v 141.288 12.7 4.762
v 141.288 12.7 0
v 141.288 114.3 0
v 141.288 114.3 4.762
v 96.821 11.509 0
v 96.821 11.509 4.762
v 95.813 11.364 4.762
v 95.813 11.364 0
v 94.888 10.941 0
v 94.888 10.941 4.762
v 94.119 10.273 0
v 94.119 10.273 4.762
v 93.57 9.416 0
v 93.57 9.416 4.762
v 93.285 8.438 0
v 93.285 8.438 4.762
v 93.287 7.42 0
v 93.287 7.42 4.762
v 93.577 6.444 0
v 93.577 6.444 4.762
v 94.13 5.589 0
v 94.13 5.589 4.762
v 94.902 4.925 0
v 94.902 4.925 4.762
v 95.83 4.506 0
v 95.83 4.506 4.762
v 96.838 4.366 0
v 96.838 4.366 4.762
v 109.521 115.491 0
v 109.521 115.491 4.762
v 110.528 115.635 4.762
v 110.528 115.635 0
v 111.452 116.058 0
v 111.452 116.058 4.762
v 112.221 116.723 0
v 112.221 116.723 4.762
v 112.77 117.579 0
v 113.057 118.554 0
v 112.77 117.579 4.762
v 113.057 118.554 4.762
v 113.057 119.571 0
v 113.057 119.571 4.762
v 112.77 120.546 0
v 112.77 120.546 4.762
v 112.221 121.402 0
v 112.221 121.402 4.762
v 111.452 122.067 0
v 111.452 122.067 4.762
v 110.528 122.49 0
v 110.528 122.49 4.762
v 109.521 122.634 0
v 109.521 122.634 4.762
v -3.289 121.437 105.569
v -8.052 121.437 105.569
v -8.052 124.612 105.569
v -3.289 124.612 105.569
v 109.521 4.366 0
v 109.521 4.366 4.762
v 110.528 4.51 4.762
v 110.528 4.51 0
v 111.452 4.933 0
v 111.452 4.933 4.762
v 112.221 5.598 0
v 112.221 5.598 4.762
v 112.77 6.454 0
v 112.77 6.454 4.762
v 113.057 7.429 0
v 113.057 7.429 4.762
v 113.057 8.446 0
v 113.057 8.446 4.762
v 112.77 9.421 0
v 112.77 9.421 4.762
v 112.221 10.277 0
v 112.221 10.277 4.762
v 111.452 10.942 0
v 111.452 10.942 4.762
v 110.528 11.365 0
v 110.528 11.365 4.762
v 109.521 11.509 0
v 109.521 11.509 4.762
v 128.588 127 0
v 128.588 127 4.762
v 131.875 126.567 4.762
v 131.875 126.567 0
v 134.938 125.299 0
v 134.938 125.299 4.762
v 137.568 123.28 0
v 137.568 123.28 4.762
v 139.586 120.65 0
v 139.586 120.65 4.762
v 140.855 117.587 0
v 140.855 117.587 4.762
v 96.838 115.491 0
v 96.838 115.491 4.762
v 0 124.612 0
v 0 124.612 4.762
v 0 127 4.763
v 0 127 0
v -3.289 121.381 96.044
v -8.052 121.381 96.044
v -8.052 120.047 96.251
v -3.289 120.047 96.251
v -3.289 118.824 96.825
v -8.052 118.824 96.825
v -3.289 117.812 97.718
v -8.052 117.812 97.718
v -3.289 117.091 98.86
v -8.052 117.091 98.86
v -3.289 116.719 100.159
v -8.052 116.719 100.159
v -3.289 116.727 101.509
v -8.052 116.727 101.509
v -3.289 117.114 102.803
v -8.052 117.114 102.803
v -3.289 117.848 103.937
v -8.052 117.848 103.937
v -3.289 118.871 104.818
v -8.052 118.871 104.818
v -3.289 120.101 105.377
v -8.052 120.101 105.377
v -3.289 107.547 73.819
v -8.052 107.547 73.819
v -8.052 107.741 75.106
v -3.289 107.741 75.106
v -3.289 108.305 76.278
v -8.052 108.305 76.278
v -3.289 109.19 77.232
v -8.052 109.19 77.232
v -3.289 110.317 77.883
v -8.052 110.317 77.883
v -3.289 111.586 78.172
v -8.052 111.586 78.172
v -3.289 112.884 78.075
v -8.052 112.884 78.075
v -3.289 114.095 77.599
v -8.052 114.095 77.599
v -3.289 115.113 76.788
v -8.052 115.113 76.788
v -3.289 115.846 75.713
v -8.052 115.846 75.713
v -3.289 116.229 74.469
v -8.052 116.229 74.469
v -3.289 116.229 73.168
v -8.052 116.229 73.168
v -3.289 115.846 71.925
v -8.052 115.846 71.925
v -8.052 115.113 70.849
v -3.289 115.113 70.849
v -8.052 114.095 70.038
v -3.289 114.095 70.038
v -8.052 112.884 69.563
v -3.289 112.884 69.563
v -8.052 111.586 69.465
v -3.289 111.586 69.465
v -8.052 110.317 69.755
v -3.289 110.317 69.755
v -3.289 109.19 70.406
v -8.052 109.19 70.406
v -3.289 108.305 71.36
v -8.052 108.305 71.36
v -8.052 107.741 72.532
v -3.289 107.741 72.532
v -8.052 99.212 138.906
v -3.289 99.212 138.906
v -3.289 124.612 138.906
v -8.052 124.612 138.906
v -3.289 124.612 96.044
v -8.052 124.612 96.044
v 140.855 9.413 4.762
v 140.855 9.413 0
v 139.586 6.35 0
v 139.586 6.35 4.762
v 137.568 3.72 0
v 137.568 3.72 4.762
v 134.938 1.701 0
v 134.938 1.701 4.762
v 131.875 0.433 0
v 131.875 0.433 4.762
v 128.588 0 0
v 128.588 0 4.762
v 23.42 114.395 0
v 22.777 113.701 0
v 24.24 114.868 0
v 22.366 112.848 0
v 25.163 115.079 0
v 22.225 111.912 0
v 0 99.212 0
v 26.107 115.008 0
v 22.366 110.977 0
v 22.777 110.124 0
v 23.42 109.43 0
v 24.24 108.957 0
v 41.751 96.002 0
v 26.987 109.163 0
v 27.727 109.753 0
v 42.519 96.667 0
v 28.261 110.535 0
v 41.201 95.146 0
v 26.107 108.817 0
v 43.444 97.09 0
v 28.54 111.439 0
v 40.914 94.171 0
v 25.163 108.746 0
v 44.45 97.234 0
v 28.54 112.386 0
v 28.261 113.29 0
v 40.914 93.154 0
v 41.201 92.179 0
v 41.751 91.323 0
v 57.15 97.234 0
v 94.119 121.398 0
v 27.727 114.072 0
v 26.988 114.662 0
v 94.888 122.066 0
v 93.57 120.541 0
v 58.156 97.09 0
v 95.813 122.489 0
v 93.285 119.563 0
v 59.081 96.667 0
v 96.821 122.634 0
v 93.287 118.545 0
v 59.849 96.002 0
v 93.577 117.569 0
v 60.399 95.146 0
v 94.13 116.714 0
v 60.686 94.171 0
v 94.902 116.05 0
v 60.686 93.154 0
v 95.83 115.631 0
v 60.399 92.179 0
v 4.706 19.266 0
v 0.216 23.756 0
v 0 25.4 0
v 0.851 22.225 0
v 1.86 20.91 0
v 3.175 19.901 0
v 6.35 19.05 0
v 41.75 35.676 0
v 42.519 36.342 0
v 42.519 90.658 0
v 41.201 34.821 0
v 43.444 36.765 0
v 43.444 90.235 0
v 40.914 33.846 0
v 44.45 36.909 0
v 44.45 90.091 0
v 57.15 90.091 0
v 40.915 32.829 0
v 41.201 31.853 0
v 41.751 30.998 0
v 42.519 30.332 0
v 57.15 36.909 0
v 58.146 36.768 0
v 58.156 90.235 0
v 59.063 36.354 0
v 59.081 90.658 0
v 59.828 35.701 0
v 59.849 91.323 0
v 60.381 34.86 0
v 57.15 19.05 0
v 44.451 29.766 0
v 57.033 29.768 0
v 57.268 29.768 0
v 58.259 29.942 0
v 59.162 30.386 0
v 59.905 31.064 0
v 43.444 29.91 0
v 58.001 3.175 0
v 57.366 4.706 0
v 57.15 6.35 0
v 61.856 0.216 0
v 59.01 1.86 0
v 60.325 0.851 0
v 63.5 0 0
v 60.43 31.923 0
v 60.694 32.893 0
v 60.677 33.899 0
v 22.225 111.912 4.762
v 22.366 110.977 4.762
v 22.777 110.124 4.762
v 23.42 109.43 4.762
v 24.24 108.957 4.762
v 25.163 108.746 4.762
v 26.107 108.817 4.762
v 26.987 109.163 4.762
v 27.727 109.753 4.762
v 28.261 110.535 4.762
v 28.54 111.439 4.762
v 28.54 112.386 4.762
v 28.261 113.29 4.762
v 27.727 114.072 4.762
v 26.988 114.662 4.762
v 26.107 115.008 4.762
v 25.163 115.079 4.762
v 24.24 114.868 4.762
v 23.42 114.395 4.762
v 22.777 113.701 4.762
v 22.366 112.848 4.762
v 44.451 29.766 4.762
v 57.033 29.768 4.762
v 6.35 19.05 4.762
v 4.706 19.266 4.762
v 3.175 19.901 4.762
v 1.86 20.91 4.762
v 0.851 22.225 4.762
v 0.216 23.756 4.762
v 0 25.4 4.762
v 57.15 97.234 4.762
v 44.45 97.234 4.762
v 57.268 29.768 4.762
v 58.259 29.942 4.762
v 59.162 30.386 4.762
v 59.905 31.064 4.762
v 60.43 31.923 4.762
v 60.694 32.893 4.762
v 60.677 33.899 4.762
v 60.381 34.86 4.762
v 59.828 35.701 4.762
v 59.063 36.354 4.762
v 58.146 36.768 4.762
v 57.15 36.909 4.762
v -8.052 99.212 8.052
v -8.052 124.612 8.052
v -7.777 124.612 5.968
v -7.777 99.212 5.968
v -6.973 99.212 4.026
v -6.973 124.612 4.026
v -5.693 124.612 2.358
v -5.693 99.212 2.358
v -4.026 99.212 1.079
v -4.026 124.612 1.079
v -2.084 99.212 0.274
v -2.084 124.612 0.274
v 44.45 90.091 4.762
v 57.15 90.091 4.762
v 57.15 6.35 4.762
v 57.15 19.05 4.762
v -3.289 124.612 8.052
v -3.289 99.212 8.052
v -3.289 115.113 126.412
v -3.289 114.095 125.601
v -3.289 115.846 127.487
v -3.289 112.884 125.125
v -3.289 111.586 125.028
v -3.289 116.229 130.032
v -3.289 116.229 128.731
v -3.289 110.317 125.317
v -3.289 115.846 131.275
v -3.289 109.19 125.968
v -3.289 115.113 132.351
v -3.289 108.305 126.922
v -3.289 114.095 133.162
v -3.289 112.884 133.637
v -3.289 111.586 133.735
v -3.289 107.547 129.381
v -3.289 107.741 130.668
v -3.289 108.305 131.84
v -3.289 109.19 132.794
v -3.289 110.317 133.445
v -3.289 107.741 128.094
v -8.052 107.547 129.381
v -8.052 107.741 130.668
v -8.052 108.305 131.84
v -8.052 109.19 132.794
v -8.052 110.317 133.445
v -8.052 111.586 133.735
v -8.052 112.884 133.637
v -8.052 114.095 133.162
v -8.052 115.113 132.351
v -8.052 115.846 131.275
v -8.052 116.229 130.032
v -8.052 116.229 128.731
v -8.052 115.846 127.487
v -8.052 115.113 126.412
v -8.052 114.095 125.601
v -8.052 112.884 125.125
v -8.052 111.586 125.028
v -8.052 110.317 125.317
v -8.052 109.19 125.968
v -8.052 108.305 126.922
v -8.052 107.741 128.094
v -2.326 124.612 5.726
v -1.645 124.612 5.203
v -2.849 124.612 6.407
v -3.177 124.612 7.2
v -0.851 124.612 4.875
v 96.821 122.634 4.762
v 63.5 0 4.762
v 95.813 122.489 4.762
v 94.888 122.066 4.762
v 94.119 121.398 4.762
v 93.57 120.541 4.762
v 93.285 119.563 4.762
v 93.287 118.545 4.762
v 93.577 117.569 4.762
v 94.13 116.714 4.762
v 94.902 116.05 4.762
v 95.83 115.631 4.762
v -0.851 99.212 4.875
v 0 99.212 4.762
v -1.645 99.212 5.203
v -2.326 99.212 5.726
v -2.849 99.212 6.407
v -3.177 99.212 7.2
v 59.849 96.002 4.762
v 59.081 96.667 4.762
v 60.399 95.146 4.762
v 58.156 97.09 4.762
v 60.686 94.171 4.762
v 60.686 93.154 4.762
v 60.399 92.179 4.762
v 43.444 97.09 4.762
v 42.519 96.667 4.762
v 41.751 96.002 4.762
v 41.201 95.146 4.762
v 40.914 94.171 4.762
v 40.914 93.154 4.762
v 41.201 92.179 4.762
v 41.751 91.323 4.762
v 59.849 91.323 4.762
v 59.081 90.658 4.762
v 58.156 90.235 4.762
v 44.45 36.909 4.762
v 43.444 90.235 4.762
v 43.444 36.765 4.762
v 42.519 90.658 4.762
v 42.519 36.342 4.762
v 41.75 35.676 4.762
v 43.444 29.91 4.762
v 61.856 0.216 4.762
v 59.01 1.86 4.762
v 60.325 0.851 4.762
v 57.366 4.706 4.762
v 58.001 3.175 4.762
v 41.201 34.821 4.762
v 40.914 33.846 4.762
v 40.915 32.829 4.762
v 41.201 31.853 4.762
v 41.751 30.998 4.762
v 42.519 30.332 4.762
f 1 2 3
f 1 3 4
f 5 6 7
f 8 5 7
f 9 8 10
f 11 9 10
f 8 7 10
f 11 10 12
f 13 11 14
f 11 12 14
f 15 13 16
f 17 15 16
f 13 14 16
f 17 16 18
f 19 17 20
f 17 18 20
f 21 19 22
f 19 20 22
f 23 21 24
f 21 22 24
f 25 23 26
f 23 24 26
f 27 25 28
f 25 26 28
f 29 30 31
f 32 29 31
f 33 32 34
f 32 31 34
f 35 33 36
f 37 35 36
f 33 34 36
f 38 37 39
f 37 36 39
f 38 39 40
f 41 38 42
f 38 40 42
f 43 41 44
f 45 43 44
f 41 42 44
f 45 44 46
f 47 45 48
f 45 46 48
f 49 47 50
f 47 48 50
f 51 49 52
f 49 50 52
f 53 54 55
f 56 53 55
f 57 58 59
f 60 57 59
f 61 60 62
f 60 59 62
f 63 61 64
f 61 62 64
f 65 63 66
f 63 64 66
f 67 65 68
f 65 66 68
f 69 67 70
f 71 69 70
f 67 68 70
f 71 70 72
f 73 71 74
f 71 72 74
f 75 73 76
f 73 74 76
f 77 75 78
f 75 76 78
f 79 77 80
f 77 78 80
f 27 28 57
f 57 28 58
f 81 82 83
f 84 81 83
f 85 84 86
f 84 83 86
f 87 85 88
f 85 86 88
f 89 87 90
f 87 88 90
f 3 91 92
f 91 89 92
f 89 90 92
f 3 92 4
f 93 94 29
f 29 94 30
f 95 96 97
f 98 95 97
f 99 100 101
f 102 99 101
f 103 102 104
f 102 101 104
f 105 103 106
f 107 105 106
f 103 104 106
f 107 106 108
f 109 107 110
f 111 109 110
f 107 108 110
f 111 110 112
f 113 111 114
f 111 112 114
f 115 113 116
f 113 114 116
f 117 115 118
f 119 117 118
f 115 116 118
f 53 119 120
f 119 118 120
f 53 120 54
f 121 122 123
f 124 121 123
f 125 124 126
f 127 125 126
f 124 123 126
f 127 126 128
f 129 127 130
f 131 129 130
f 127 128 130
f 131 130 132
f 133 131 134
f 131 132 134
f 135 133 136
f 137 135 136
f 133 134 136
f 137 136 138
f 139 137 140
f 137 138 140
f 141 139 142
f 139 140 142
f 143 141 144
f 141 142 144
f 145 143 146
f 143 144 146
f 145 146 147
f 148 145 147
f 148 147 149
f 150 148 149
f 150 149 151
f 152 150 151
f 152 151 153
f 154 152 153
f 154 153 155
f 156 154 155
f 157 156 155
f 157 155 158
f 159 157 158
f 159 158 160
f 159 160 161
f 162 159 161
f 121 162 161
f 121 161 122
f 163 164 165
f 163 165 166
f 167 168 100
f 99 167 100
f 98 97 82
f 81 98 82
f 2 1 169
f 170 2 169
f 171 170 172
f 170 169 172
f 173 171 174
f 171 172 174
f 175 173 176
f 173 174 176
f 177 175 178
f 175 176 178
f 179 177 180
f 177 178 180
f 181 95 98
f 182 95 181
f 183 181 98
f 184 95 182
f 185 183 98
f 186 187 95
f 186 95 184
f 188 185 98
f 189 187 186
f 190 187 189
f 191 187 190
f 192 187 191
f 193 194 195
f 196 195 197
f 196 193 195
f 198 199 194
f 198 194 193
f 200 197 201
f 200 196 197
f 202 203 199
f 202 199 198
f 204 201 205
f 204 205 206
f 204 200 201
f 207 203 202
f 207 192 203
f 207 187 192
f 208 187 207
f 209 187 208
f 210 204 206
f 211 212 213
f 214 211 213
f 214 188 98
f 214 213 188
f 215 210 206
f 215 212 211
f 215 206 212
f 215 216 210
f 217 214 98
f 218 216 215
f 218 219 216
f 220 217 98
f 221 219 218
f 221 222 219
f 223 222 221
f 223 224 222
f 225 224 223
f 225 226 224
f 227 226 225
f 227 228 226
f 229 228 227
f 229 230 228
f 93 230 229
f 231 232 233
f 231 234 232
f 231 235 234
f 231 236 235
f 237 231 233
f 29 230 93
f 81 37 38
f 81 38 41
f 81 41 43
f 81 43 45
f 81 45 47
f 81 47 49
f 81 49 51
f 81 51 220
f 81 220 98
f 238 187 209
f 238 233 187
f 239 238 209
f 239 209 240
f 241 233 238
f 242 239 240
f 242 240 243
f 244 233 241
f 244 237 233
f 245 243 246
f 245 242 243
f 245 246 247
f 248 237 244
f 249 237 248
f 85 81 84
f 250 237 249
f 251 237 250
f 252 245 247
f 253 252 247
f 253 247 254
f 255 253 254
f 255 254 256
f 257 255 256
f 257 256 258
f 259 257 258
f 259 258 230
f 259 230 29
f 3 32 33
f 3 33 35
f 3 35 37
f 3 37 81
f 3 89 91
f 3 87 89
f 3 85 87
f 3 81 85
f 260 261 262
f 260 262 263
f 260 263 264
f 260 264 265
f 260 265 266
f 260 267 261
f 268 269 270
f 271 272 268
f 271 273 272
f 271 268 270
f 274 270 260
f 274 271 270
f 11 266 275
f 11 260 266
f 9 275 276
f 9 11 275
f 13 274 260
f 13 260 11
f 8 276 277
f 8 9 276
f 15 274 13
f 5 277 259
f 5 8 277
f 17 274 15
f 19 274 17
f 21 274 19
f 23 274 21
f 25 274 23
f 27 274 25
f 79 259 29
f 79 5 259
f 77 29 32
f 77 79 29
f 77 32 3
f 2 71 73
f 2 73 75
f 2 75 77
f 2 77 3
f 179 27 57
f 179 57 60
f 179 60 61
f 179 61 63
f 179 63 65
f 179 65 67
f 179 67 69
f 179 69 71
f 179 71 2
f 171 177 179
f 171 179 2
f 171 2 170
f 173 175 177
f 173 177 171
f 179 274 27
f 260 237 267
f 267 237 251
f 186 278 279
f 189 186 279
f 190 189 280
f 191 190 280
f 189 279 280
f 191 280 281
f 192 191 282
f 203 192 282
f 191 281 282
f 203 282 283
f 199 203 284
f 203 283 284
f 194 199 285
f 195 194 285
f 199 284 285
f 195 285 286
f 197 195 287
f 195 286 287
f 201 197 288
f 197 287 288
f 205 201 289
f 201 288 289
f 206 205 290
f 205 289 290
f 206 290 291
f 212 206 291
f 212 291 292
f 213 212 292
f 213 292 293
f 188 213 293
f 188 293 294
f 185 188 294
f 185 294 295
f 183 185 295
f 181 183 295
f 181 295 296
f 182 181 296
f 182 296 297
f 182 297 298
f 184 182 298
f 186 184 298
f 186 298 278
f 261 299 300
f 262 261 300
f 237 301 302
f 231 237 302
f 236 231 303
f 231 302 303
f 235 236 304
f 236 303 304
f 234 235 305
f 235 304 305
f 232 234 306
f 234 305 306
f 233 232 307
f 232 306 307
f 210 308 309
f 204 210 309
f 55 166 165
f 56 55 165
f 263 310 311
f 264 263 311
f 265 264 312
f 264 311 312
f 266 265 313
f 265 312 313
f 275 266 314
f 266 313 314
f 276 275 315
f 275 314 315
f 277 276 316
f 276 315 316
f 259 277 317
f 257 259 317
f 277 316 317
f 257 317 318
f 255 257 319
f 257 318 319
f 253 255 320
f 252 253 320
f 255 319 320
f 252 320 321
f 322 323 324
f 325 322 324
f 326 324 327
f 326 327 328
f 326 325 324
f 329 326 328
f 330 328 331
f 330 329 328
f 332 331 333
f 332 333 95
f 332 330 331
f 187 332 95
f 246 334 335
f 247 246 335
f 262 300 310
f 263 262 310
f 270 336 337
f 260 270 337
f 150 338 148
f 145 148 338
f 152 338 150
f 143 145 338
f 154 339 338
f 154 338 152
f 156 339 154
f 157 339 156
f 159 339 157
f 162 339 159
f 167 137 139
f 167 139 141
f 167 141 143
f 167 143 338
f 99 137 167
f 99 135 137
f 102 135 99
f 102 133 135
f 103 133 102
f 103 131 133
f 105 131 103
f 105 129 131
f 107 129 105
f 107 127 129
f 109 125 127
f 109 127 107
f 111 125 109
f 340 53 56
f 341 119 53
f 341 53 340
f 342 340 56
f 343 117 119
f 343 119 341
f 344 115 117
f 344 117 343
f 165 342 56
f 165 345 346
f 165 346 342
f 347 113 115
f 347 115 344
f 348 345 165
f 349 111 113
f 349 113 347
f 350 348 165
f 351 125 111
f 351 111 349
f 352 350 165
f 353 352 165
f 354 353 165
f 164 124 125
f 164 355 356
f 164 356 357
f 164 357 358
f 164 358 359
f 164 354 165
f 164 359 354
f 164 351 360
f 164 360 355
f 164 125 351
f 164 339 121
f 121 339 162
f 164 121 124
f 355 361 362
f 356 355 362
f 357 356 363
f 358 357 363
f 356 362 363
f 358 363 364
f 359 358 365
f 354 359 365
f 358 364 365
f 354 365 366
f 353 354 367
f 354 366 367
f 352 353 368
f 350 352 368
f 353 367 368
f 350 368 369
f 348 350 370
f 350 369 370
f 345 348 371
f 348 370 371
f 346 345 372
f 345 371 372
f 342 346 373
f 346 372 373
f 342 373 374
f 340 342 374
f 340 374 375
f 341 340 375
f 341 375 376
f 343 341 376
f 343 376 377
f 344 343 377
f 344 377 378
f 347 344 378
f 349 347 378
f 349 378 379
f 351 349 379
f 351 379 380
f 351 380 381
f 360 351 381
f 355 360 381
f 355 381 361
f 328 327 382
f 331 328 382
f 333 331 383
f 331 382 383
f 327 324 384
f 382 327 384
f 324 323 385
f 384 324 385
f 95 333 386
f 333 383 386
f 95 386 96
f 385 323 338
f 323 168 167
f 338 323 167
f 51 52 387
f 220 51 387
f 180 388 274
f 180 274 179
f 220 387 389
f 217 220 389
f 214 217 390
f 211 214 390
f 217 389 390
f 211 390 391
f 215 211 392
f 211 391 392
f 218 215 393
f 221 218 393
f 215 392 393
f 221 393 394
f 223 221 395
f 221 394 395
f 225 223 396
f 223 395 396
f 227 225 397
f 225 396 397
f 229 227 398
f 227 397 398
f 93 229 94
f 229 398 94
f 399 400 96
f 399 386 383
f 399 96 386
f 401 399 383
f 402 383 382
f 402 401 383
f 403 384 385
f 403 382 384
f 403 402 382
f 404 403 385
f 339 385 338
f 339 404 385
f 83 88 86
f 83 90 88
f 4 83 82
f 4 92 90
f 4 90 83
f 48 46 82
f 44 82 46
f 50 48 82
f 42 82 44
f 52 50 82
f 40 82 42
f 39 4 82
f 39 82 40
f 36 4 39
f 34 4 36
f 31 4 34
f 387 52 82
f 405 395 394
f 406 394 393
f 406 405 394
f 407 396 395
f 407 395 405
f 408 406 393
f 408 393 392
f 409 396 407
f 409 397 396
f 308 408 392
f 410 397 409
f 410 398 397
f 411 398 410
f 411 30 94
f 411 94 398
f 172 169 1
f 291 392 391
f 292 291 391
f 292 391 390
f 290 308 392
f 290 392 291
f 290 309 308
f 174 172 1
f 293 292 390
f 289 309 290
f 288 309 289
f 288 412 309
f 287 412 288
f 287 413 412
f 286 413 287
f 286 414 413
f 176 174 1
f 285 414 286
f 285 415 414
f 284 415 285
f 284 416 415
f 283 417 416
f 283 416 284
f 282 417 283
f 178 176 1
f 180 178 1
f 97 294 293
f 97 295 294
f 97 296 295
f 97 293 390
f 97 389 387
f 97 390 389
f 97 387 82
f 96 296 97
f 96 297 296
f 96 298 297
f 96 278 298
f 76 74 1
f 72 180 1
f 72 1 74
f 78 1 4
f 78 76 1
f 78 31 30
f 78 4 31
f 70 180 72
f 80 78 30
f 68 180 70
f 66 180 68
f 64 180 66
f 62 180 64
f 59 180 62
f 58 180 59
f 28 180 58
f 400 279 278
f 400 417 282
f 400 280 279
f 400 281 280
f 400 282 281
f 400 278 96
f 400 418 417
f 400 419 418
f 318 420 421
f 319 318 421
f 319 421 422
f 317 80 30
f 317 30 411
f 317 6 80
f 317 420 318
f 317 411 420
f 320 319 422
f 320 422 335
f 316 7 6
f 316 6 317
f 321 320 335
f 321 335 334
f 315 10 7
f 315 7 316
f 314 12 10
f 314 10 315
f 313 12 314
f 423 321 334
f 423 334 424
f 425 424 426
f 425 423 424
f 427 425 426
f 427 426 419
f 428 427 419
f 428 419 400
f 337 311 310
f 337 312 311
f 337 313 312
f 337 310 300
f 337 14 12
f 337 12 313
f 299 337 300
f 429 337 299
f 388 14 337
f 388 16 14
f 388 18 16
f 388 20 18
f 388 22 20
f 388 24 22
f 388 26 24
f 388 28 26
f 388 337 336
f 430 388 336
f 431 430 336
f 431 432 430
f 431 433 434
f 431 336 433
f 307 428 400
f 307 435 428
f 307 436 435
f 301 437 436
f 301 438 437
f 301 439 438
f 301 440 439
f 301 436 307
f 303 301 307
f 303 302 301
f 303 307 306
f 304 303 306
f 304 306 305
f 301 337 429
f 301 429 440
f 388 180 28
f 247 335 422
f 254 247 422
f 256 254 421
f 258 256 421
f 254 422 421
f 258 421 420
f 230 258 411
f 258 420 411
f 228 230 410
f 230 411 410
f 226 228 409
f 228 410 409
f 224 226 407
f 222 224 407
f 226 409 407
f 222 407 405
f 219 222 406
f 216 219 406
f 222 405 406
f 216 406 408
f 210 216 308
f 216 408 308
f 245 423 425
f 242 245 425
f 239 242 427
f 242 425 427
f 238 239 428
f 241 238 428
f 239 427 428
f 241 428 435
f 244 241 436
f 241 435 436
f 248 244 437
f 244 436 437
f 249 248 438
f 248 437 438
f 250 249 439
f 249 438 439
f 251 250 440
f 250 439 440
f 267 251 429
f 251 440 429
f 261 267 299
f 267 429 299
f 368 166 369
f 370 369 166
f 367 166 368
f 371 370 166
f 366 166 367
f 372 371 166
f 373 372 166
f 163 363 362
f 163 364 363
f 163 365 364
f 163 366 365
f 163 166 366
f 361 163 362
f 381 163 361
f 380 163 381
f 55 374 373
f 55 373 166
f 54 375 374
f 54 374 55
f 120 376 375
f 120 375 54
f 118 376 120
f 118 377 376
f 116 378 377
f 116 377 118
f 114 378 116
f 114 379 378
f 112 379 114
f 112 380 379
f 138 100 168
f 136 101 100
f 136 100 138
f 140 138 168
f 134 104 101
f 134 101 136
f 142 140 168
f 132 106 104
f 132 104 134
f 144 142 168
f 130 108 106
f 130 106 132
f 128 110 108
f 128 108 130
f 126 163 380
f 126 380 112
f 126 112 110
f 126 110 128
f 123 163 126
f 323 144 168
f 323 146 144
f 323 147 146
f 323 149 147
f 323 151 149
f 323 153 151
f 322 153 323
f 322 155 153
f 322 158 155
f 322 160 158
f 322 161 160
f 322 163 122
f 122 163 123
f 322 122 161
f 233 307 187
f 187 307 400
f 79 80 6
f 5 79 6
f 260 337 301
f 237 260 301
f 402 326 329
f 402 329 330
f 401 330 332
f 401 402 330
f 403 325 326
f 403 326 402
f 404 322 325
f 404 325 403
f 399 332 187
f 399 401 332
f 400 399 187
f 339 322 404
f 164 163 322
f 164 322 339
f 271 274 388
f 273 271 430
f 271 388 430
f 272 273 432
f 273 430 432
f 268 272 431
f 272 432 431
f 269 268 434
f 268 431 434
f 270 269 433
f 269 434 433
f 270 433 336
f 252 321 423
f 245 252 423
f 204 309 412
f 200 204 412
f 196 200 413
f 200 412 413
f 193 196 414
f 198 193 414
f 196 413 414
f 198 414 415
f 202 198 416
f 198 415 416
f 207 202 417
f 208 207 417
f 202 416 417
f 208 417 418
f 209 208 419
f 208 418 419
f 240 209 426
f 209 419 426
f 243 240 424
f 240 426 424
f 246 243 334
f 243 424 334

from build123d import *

# Parameters (mm, degrees)
F1_DEPTH = 127
F2_W     = 8.0518
F2_H     = 2.3876
F2_H_2   = 99.2124
F3_DEPTH = 138.90725
F5_DEPTH = 4.7635
F6_R     = 4.365625
F7_DEPTH = 149.3403


# Not quite as in the source:
# - a feature names something its author has since deleted; it is built from what else it names


with BuildPart() as f1:
    # F0 (on Front) → F1 (new body)
    with BuildSketch(Plane.XZ):
        with BuildLine():
            ThreePointArc((-8.0518, 8.0518), (-5.6934823808, 2.3583176192), (0, 0))
            Line((0, 0), (141.2875, 0))
            Line((141.2875, 0), (141.2875, 4.7625))
            Line((141.2875, 4.7625), (0, 4.7625))
            ThreePointArc((0, 4.7625), (-2.3258863354, 5.7259136646), (-3.2893, 8.0518))
            Line((-3.2893, 8.0518), (-3.2893, 138.90625))
            Line((-3.2893, 138.90625), (-8.0518, 138.90625))
            Line((-8.0518, 138.90625), (-8.0518, 8.0518))
        make_face()
    extrude(amount=-F1_DEPTH)

    # F2 (on face) → F3 (cut, through all)
    with BuildSketch(Plane.XY.offset(138.90625)):
        with Locations((-4.0259, 125.8062)):
            Rectangle(F2_W, F2_H)
        with Locations((-4.0259, 49.6062)):
            Rectangle(F2_W, F2_H_2)
    extrude(amount=-F3_DEPTH, mode=Mode.SUBTRACT)

    # F4 (on face) → F5 (cut, through all)
    with BuildSketch(Plane.XY.offset(4.7625)):
        with BuildLine():
            Line((44.45, 90.090625), (57.15, 90.090625))
            ThreePointArc((57.15, 90.090625), (60.721875, 93.6625), (57.15, 97.234375))
            Line((57.15, 97.234375), (44.45, 97.234375))
            ThreePointArc((44.45, 97.234375), (40.878125, 93.6625), (44.45, 90.090625))
        make_face()
        with BuildLine():
            Line((96.8380470509, 115.4906250419), (109.5212624401, 115.490625))
            ThreePointArc((109.5212624401, 115.490625), (113.0931374401, 119.0625055472), (109.5212513457, 122.634375))
            Line((109.5212513457, 122.634375), (96.8212513457, 122.6343355532))
            ThreePointArc((96.8212513457, 122.6343355532), (93.2493862179, 119.0540626774), (96.8380470509, 115.4906250419))
        make_face()
        with BuildLine():
            Line((44.4505470509, 29.7656250419), (57.0326853587, 29.7675520605))
            Line((57.0326853587, 29.7675520605), (57.2684081472, 29.7675881627))
            ThreePointArc((57.2684081472, 29.7675881627), (60.7213841756, 33.3967122102), (57.15, 36.909375))
            Line((57.15, 36.909375), (44.45, 36.909375))
            ThreePointArc((44.45, 36.909375), (40.8781250105, 33.3372264746), (44.4505470509, 29.7656250419))
        make_face()
        with BuildLine():
            Line((141.2875, 127), (128.5875, 127))
            ThreePointArc((128.5875, 127), (137.5677561211, 123.2802561211), (141.2875, 114.3))
            Line((141.2875, 114.3), (141.2875, 127))
        make_face()
        with BuildLine():
            ThreePointArc((6.35, 19.05), (1.8598719395, 20.9098719395), (0, 25.4))
            Line((0, 25.4), (0, 0))
            Line((0, 0), (63.5, 0))
            ThreePointArc((63.5, 0), (59.0098719395, 1.8598719395), (57.15, 6.35))
            Line((57.15, 6.35), (57.15, 19.05))
            Line((57.15, 19.05), (6.35, 19.05))
        make_face()
        with BuildLine():
            ThreePointArc((28.575, 111.9124), (25.4, 115.0874), (22.225, 111.9124))
            ThreePointArc((22.225, 111.9124), (25.4, 108.7374), (28.575, 111.9124))
        make_face()
        with BuildLine():
            Line((96.8380470509, 4.3656250419), (109.5212624401, 4.365625))
            ThreePointArc((109.5212624401, 4.365625), (113.0931374401, 7.9375055472), (109.5212513457, 11.509375))
            Line((109.5212513457, 11.509375), (96.8212513457, 11.5093355532))
            ThreePointArc((96.8212513457, 11.5093355532), (93.2493862179, 7.9290626774), (96.8380470509, 4.3656250419))
        make_face()
        with BuildLine():
            Line((141.2875, 0), (141.2875, 12.7))
            ThreePointArc((141.2875, 12.7), (137.5677561211, 3.7197438789), (128.5875, 0))
            Line((128.5875, 0), (141.2875, 0))
        make_face()
    extrude(amount=-F5_DEPTH, mode=Mode.SUBTRACT)

    # F6 (on face) → F7 (cut, through all)
    with BuildSketch(Plane(origin=(-8.0518, 0, 0), x_dir=(0, -1, 0), z_dir=(-1, 0, 0))):
        with BuildLine():
            Line((-121.4374, 105.56875), (-124.6124, 105.56875))
            Line((-124.6124, 105.56875), (-124.6124, 96.0440792053))
            Line((-124.6124, 96.0440792053), (-121.4933961759, 96.0440792053))
            Line((-121.4933961759, 96.0440792053), (-121.3814038241, 96.0440792053))
            ThreePointArc((-121.3814038241, 96.0440792053), (-116.674982302, 100.8342485718), (-121.4374, 105.56875))
        make_face()
        with Locations((-111.9124, 129.38125)):
            Circle(F6_R)
        with Locations((-111.9124, 73.81875)):
            Circle(F6_R)
    extrude(amount=-F7_DEPTH, mode=Mode.SUBTRACT)


solid = f1.part
